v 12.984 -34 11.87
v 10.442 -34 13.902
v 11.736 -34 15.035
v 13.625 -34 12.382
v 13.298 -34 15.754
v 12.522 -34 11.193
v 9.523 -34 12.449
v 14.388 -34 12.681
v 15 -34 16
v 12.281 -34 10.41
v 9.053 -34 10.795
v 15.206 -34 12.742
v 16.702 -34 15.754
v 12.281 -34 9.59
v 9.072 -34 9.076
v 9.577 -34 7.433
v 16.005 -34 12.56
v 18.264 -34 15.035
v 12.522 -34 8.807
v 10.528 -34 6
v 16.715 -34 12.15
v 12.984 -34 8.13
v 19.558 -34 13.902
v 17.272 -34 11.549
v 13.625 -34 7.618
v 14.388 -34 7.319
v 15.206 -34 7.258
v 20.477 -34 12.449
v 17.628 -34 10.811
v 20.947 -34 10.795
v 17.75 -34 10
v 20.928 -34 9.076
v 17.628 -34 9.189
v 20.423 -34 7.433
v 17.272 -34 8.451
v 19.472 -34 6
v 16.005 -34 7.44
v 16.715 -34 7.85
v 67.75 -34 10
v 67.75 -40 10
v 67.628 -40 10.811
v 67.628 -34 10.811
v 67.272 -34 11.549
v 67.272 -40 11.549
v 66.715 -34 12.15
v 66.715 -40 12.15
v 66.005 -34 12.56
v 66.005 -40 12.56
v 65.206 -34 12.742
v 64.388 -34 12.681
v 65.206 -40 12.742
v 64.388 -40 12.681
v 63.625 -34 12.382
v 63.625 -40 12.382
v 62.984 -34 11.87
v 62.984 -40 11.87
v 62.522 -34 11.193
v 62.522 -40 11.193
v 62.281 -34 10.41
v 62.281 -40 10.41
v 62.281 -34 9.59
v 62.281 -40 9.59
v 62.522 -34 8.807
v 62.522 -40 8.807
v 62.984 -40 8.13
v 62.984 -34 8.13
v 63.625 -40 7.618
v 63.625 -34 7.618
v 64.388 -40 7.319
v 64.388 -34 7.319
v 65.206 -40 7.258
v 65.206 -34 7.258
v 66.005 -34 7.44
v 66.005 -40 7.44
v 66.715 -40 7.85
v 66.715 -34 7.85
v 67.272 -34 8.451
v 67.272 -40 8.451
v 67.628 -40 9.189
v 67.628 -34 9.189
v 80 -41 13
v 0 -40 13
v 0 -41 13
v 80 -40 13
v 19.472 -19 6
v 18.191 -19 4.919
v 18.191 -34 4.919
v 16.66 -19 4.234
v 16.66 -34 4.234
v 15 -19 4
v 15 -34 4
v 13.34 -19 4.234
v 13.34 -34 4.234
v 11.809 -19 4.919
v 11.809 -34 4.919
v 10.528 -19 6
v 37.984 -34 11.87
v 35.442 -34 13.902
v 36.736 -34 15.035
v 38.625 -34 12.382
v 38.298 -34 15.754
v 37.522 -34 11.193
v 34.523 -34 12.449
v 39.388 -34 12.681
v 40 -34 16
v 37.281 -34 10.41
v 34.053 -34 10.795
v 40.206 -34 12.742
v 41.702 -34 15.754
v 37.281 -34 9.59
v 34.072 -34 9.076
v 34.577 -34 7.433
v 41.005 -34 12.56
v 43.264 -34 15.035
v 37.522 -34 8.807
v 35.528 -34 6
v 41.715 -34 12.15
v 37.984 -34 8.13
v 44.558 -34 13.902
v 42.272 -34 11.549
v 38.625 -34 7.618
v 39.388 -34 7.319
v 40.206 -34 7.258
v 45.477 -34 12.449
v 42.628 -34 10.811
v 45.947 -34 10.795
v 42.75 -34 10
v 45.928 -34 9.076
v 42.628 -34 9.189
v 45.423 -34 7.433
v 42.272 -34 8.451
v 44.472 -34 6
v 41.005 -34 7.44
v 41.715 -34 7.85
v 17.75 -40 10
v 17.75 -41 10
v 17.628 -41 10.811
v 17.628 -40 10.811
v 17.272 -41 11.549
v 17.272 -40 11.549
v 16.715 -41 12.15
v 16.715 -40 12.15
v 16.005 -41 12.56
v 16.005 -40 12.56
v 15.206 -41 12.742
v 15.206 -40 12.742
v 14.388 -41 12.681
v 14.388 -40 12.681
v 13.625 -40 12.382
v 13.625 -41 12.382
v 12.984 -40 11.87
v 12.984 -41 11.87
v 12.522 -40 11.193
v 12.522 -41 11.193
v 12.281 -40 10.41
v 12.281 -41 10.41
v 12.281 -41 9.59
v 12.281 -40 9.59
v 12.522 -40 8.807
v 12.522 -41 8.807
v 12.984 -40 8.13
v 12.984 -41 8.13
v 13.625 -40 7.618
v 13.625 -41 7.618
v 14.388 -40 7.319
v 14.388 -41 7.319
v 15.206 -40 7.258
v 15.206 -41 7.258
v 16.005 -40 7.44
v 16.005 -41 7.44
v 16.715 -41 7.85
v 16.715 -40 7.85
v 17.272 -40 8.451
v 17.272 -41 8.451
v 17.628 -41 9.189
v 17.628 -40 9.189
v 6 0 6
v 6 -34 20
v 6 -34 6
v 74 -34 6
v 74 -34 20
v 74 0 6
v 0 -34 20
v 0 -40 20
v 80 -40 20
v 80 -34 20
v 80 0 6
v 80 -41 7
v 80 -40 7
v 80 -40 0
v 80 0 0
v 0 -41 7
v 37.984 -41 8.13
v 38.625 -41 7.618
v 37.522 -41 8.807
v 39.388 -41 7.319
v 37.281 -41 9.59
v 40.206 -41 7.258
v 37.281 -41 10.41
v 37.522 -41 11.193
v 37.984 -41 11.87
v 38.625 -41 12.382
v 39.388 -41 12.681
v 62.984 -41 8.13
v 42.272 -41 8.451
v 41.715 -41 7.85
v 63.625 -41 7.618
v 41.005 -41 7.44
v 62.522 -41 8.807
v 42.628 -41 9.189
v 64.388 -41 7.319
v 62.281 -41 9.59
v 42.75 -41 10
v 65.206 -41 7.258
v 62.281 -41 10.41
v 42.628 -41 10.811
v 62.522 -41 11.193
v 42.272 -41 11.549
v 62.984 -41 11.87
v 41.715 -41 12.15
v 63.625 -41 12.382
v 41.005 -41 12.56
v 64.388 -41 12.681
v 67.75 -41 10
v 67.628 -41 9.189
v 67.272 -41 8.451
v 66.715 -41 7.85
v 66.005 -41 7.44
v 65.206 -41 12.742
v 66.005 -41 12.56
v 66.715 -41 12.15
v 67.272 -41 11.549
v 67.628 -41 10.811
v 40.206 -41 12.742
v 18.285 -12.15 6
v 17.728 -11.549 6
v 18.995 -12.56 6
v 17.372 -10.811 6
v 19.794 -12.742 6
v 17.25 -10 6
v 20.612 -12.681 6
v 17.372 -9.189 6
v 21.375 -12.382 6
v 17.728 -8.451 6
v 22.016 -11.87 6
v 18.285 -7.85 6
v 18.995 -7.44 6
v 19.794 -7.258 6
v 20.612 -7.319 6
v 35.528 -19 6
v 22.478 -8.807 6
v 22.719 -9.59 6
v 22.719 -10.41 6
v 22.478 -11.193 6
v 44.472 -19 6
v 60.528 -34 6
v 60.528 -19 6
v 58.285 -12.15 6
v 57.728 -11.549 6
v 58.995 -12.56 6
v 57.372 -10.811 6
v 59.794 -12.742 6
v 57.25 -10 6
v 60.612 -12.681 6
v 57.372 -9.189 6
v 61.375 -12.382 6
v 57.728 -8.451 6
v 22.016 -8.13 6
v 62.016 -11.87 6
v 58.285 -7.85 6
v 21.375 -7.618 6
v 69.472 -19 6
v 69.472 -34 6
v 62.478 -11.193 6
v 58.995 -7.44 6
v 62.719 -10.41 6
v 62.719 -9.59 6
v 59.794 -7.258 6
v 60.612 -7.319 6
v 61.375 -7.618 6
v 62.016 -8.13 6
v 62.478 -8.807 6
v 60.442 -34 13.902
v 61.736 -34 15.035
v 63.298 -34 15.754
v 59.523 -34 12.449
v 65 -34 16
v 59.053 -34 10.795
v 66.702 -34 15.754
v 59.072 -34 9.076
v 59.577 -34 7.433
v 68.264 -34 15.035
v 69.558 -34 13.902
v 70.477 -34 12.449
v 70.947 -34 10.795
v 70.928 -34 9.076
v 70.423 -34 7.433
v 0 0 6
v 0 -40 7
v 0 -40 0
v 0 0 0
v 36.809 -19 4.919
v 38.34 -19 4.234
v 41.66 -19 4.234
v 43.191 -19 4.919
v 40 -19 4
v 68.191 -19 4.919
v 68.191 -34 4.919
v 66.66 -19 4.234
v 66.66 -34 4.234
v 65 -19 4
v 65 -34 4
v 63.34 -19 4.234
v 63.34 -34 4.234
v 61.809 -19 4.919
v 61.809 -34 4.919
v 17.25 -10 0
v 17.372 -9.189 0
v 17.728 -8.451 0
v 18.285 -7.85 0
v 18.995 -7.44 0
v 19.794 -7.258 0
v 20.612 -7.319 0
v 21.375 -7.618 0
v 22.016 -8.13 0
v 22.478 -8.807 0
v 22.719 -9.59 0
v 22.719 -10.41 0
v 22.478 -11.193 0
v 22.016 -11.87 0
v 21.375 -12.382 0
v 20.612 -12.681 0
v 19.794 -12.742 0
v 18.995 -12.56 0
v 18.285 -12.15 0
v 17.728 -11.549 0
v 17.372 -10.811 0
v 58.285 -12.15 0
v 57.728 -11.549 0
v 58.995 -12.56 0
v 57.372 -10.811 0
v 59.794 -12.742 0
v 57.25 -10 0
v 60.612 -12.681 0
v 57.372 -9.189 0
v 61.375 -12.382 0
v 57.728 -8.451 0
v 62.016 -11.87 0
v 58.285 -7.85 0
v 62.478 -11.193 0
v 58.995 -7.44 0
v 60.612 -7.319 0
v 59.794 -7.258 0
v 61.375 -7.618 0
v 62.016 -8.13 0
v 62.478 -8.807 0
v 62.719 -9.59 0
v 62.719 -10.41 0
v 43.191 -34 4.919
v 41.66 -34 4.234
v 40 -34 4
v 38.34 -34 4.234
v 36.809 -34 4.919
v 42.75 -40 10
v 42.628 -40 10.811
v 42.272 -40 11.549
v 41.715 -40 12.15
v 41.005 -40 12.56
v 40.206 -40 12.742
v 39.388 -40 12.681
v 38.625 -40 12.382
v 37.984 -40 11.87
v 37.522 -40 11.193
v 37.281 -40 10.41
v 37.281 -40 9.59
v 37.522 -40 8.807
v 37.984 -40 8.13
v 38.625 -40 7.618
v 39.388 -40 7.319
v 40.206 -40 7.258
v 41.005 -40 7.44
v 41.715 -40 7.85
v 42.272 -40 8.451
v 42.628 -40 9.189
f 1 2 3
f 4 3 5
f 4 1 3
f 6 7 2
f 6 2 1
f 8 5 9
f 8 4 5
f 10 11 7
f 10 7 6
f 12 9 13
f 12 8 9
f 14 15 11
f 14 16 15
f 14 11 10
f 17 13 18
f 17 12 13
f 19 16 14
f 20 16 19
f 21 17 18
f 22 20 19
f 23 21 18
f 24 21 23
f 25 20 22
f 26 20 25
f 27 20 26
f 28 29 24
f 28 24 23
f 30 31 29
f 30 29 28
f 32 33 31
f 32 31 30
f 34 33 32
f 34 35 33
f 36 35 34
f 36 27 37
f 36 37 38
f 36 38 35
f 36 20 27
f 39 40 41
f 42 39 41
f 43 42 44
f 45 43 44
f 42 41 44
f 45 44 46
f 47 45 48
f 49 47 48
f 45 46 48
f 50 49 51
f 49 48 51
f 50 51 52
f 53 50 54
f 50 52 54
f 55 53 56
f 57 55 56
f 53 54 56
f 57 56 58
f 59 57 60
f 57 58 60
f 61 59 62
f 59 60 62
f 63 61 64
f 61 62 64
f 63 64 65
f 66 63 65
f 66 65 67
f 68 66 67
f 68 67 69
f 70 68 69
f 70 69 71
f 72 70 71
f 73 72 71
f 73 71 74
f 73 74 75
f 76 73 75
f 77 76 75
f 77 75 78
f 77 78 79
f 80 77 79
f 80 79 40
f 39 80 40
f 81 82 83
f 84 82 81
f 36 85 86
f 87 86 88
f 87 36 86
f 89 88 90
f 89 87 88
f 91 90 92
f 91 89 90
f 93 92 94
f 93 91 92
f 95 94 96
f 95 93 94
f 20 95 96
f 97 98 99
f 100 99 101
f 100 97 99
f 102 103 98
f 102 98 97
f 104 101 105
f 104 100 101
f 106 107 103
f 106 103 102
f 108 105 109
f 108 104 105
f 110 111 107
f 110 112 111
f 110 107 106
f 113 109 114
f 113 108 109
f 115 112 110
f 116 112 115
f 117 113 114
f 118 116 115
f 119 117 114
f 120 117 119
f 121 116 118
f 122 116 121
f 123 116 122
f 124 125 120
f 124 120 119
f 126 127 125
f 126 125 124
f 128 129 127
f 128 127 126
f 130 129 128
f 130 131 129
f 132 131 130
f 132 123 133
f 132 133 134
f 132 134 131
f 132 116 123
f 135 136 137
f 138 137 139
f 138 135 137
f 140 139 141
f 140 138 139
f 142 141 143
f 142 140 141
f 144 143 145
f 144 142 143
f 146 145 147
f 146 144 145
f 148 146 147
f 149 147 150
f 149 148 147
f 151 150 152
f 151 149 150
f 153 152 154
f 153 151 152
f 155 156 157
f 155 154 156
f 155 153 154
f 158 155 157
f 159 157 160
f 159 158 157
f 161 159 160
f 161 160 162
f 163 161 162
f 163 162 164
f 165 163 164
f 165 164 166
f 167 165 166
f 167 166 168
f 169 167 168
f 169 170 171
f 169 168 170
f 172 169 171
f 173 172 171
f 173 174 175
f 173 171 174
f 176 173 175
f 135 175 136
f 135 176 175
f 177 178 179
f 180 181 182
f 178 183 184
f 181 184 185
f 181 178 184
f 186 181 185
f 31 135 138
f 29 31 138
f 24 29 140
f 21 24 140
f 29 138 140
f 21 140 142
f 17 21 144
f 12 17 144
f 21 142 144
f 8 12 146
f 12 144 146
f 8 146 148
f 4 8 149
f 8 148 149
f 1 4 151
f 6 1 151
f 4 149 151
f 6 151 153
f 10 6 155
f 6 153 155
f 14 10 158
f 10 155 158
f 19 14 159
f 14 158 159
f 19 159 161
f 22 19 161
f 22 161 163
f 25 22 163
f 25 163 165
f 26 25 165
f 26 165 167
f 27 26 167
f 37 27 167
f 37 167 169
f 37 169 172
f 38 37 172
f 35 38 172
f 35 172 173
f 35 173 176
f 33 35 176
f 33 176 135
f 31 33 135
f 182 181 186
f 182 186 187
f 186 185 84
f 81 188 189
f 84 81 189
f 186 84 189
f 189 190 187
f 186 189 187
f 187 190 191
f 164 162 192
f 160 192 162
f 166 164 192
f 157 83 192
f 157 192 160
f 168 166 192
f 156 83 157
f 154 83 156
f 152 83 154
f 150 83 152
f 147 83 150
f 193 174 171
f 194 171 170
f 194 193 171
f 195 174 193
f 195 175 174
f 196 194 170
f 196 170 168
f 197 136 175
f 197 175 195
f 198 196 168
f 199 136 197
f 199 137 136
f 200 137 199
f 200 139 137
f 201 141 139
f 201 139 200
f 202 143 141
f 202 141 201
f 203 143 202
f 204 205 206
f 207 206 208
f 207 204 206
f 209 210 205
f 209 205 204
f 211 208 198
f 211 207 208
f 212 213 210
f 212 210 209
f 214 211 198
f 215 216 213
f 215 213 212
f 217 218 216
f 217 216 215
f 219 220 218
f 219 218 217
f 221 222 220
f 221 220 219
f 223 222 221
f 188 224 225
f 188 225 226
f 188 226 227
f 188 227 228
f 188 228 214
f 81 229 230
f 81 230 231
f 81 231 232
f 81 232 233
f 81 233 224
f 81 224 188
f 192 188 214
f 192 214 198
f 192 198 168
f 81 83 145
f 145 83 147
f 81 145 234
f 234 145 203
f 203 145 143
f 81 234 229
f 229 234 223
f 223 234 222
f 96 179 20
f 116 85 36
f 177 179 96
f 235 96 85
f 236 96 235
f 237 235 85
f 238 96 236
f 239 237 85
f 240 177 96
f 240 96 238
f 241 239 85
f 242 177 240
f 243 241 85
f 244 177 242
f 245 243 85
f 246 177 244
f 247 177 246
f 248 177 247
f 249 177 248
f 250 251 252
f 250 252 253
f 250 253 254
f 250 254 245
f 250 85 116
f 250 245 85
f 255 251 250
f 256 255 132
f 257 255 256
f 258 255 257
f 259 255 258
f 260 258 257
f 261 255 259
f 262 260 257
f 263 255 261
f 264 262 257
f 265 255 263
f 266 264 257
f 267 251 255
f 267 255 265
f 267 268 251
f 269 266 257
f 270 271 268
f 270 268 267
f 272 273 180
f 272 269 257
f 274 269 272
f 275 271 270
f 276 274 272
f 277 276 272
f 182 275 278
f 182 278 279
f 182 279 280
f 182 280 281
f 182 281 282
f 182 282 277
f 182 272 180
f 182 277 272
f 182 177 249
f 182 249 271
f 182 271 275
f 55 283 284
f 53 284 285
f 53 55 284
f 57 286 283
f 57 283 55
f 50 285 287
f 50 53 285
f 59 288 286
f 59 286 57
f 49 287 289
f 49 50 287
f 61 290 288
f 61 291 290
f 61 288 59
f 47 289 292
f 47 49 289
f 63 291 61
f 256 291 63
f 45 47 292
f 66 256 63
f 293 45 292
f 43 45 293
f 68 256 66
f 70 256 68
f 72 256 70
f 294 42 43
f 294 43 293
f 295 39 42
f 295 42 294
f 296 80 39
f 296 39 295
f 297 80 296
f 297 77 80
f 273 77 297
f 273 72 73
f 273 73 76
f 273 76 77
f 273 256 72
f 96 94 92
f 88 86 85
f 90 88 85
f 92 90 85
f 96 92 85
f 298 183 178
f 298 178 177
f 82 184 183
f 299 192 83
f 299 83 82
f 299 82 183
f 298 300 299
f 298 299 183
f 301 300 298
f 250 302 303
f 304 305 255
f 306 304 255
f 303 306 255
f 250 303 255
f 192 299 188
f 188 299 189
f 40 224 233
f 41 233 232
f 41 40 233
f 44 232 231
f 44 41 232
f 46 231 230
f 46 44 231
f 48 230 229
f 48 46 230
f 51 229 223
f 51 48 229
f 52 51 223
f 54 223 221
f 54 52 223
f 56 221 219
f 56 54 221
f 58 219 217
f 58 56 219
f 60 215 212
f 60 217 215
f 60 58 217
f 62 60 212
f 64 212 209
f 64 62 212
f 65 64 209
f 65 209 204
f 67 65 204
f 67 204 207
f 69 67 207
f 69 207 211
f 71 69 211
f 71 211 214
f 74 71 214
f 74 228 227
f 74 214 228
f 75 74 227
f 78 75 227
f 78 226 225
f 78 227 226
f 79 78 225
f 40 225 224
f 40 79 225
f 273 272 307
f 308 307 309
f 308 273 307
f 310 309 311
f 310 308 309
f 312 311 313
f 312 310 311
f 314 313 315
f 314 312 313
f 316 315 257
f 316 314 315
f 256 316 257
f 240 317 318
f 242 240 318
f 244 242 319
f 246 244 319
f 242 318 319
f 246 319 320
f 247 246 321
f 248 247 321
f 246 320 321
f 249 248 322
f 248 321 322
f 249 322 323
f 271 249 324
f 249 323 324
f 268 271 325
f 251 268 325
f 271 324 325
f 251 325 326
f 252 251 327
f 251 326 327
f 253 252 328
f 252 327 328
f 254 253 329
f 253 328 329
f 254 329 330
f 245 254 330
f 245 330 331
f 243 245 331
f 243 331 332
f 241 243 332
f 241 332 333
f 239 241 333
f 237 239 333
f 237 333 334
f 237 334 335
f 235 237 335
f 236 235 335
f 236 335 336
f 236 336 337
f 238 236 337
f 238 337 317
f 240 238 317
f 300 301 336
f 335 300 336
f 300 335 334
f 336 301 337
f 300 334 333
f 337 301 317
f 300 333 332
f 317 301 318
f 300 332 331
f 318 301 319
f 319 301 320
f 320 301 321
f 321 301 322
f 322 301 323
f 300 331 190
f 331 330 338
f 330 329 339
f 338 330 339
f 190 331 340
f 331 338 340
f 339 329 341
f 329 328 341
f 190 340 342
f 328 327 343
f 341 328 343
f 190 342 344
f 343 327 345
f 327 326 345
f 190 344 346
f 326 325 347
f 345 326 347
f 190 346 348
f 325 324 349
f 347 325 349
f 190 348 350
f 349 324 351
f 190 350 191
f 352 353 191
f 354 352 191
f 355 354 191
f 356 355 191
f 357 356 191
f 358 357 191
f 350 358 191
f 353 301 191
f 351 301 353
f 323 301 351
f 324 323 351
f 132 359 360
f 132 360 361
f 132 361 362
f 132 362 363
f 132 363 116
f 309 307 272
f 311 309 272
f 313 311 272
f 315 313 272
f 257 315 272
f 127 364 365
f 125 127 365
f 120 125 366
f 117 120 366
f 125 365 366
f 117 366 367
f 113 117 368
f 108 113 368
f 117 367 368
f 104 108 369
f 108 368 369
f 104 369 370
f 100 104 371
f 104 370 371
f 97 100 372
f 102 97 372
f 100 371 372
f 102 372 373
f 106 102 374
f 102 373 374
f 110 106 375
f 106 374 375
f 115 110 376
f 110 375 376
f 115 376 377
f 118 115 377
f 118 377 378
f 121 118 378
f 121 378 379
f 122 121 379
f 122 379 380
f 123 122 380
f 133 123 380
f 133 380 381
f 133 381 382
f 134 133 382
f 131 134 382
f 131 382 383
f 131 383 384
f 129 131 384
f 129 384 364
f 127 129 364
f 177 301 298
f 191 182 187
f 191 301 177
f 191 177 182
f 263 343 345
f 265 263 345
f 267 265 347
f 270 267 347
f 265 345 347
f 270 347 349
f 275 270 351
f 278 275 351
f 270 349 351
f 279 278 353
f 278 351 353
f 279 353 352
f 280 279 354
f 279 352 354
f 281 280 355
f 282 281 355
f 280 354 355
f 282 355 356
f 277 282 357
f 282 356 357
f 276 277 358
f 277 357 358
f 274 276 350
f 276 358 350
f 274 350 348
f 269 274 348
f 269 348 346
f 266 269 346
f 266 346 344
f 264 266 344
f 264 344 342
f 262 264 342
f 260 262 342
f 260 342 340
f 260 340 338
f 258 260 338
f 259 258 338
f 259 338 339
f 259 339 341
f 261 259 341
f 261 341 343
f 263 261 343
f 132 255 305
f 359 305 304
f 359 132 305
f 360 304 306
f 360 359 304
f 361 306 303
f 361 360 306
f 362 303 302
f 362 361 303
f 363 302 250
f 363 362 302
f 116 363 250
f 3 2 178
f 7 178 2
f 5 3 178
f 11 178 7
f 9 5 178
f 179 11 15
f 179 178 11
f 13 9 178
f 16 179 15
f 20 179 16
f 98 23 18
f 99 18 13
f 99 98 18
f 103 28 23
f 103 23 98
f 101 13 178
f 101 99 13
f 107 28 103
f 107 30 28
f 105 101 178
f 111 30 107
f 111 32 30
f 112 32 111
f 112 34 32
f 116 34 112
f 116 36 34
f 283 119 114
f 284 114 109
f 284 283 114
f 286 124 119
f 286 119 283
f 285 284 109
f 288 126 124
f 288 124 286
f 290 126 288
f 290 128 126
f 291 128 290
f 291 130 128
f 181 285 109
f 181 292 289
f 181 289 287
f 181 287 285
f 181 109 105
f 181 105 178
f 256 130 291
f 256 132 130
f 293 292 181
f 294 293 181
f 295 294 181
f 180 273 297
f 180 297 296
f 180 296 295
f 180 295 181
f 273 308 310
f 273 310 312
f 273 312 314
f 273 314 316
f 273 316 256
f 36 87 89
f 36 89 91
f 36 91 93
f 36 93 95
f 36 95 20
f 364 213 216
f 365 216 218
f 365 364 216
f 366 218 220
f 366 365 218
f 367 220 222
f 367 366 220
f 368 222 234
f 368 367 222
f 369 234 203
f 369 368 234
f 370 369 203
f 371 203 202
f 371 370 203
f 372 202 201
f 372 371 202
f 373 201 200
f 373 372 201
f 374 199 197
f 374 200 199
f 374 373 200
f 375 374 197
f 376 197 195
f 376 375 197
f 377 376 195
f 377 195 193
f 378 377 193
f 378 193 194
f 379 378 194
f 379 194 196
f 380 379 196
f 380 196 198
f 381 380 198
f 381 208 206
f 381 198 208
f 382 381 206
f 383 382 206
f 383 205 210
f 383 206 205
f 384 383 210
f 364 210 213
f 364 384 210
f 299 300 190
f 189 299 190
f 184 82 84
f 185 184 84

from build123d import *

# Parameters (mm, degrees)
CROQUIS1_W                 = 80
CROQUIS1_H                 = 40
SALIENTE_EXTRUIR1_DEPTH    = 20
CROQUIS2_W                 = 68
CROQUIS2_H                 = 14
CORTAR_EXTRUIR1_DEPTH      = 34
CORTAR_EXTRUIR2_DEPTH      = 80
CORTAR_EXTRUIR3_REACH      = 22
CROQUIS4_R                 = 2.75
CROQUIS8_W                 = 80
CROQUIS8_H                 = 6
SALIENTE_EXTRUIR2_DEPTH    = 1
CROQUIS5_R                 = 2.75
CORTAR_EXTRUIR6_DEPTH      = 2
CORTAR_EXTRUIR6_DEPTH_BACK = 41
CROQUIS9_R                 = 6
CORTAR_EXTRUIR8_DEPTH      = 15


with BuildPart() as part:
    # Croquis1 → Saliente-Extruir1 (new body)
    with BuildSketch(Plane.XY):
        with Locations((40, -20)):
            Rectangle(CROQUIS1_W, CROQUIS1_H)
    extrude(amount=SALIENTE_EXTRUIR1_DEPTH)

    # Croquis2 → Cortar-Extruir1 (cut)
    with BuildSketch(Plane(origin=(0, 0, 0), x_dir=(1, 0, 0), z_dir=(0, 1, 0))):
        with Locations((40, -13)):
            Rectangle(CROQUIS2_W, CROQUIS2_H)
    extrude(amount=-CORTAR_EXTRUIR1_DEPTH, mode=Mode.SUBTRACT)

    # Croquis3 → Cortar-Extruir2 (cut)
    with BuildSketch(Plane.ZY):
        Polygon((20, 0), (20, -34), (6, 0), align=None)
    extrude(amount=-CORTAR_EXTRUIR2_DEPTH, mode=Mode.SUBTRACT)

    # Croquis4 → Cortar-Extruir3 (cut, up to next)
    with BuildSketch(Plane(origin=(0, 0, 0), x_dir=(-1, 0, 0), z_dir=(0, 0, -1)), mode=Mode.PRIVATE) as cortar_extruir3_sk1:
        with Locations((-60, -10)):
            Circle(CROQUIS4_R)
    cortar_extruir3_tool1 = extrude(cortar_extruir3_sk1.sketch, amount=-CORTAR_EXTRUIR3_REACH, mode=Mode.PRIVATE) & part.part
    add(cortar_extruir3_tool1.solids().sort_by_distance((60, -10, 0))[0], mode=Mode.SUBTRACT)
    # Croquis4 → Cortar-Extruir3 (cut, up to next)
    with BuildSketch(Plane(origin=(0, 0, 0), x_dir=(-1, 0, 0), z_dir=(0, 0, -1)), mode=Mode.PRIVATE) as cortar_extruir3_sk2:
        with Locations((-20, -10)):
            Circle(CROQUIS4_R)
    cortar_extruir3_tool2 = extrude(cortar_extruir3_sk2.sketch, amount=-CORTAR_EXTRUIR3_REACH, mode=Mode.PRIVATE) & part.part
    add(cortar_extruir3_tool2.solids().sort_by_distance((20, -10, 0))[0], mode=Mode.SUBTRACT)

    # Croquis8 → Saliente-Extruir2 (add)
    with BuildSketch(Plane.XZ.offset(40)):
        with Locations((40, 10)):
            Rectangle(CROQUIS8_W, CROQUIS8_H)
    extrude(amount=SALIENTE_EXTRUIR2_DEPTH)

    # Croquis5 → Cortar-Extruir6 (cut, two sides)
    with BuildSketch(Plane.XZ.offset(40)) as cortar_extruir6_sk:
        with Locations((15, 10)):
            Circle(CROQUIS5_R)
        with Locations((40, 10)):
            Circle(CROQUIS5_R)
        with Locations((65, 10)):
            Circle(CROQUIS5_R)
    extrude(amount=CORTAR_EXTRUIR6_DEPTH, mode=Mode.SUBTRACT)
    extrude(cortar_extruir6_sk.sketch, amount=-CORTAR_EXTRUIR6_DEPTH_BACK, mode=Mode.SUBTRACT)

    # Croquis9 → Cortar-Extruir8 (cut)
    with BuildSketch(Plane(origin=(0, -34, 0), x_dir=(1, 0, 0), z_dir=(0, 1, 0))):
        with Locations((15, -10)):
            Circle(CROQUIS9_R)
        with Locations((40, -10)):
            Circle(CROQUIS9_R)
        with Locations((65, -10)):
            Circle(CROQUIS9_R)
    extrude(amount=CORTAR_EXTRUIR8_DEPTH, mode=Mode.SUBTRACT)


solid = part.part
